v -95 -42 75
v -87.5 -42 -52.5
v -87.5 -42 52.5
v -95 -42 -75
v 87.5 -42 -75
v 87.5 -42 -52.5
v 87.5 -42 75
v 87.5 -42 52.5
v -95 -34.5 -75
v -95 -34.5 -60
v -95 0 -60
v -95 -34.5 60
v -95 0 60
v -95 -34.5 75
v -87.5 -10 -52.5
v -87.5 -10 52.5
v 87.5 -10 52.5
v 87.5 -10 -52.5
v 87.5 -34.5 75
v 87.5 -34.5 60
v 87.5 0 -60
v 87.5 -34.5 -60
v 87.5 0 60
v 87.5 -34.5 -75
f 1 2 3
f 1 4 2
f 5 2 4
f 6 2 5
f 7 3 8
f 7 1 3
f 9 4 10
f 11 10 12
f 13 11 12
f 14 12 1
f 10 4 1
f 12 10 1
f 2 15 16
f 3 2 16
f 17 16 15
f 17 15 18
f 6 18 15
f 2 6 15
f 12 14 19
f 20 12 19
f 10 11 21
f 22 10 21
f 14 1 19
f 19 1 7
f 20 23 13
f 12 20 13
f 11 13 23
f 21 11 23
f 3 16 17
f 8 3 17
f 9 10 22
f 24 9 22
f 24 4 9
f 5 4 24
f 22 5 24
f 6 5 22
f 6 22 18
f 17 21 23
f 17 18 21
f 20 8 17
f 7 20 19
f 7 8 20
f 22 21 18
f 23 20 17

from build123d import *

# Parameters (mm, degrees)
F0_W     = 175
F0_H     = 105
F1_DEPTH = 10
F2_DEPTH = 42
F3_W     = 182.5
F3_H     = 15
F4_DEPTH = 7.5


with BuildPart() as f1:
    # F0 (on Front) → F1 (new body)
    with BuildSketch(Plane.XZ):
        Rectangle(F0_W, F0_H)
    extrude(amount=F1_DEPTH)

    # F0 (on Front) → F2 (join)
    with BuildSketch(Plane.XZ):
        Polygon((-87.5, 52.5), (87.5, 52.5), (87.5, 60), (-95, 60), (-95, -60), (87.5, -60), (87.5, -52.5), (-87.5, -52.5), align=None)
    extrude(amount=F2_DEPTH)

    # F3 (on face) → F4 (join)
    with BuildSketch(Plane.XZ.offset(42)):
        with Locations((-3.75, 67.5)):
            Rectangle(F3_W, F3_H)
        with Locations((-3.75, -67.5)):
            Rectangle(F3_W, F3_H)
    extrude(amount=-F4_DEPTH)


solid = f1.part
